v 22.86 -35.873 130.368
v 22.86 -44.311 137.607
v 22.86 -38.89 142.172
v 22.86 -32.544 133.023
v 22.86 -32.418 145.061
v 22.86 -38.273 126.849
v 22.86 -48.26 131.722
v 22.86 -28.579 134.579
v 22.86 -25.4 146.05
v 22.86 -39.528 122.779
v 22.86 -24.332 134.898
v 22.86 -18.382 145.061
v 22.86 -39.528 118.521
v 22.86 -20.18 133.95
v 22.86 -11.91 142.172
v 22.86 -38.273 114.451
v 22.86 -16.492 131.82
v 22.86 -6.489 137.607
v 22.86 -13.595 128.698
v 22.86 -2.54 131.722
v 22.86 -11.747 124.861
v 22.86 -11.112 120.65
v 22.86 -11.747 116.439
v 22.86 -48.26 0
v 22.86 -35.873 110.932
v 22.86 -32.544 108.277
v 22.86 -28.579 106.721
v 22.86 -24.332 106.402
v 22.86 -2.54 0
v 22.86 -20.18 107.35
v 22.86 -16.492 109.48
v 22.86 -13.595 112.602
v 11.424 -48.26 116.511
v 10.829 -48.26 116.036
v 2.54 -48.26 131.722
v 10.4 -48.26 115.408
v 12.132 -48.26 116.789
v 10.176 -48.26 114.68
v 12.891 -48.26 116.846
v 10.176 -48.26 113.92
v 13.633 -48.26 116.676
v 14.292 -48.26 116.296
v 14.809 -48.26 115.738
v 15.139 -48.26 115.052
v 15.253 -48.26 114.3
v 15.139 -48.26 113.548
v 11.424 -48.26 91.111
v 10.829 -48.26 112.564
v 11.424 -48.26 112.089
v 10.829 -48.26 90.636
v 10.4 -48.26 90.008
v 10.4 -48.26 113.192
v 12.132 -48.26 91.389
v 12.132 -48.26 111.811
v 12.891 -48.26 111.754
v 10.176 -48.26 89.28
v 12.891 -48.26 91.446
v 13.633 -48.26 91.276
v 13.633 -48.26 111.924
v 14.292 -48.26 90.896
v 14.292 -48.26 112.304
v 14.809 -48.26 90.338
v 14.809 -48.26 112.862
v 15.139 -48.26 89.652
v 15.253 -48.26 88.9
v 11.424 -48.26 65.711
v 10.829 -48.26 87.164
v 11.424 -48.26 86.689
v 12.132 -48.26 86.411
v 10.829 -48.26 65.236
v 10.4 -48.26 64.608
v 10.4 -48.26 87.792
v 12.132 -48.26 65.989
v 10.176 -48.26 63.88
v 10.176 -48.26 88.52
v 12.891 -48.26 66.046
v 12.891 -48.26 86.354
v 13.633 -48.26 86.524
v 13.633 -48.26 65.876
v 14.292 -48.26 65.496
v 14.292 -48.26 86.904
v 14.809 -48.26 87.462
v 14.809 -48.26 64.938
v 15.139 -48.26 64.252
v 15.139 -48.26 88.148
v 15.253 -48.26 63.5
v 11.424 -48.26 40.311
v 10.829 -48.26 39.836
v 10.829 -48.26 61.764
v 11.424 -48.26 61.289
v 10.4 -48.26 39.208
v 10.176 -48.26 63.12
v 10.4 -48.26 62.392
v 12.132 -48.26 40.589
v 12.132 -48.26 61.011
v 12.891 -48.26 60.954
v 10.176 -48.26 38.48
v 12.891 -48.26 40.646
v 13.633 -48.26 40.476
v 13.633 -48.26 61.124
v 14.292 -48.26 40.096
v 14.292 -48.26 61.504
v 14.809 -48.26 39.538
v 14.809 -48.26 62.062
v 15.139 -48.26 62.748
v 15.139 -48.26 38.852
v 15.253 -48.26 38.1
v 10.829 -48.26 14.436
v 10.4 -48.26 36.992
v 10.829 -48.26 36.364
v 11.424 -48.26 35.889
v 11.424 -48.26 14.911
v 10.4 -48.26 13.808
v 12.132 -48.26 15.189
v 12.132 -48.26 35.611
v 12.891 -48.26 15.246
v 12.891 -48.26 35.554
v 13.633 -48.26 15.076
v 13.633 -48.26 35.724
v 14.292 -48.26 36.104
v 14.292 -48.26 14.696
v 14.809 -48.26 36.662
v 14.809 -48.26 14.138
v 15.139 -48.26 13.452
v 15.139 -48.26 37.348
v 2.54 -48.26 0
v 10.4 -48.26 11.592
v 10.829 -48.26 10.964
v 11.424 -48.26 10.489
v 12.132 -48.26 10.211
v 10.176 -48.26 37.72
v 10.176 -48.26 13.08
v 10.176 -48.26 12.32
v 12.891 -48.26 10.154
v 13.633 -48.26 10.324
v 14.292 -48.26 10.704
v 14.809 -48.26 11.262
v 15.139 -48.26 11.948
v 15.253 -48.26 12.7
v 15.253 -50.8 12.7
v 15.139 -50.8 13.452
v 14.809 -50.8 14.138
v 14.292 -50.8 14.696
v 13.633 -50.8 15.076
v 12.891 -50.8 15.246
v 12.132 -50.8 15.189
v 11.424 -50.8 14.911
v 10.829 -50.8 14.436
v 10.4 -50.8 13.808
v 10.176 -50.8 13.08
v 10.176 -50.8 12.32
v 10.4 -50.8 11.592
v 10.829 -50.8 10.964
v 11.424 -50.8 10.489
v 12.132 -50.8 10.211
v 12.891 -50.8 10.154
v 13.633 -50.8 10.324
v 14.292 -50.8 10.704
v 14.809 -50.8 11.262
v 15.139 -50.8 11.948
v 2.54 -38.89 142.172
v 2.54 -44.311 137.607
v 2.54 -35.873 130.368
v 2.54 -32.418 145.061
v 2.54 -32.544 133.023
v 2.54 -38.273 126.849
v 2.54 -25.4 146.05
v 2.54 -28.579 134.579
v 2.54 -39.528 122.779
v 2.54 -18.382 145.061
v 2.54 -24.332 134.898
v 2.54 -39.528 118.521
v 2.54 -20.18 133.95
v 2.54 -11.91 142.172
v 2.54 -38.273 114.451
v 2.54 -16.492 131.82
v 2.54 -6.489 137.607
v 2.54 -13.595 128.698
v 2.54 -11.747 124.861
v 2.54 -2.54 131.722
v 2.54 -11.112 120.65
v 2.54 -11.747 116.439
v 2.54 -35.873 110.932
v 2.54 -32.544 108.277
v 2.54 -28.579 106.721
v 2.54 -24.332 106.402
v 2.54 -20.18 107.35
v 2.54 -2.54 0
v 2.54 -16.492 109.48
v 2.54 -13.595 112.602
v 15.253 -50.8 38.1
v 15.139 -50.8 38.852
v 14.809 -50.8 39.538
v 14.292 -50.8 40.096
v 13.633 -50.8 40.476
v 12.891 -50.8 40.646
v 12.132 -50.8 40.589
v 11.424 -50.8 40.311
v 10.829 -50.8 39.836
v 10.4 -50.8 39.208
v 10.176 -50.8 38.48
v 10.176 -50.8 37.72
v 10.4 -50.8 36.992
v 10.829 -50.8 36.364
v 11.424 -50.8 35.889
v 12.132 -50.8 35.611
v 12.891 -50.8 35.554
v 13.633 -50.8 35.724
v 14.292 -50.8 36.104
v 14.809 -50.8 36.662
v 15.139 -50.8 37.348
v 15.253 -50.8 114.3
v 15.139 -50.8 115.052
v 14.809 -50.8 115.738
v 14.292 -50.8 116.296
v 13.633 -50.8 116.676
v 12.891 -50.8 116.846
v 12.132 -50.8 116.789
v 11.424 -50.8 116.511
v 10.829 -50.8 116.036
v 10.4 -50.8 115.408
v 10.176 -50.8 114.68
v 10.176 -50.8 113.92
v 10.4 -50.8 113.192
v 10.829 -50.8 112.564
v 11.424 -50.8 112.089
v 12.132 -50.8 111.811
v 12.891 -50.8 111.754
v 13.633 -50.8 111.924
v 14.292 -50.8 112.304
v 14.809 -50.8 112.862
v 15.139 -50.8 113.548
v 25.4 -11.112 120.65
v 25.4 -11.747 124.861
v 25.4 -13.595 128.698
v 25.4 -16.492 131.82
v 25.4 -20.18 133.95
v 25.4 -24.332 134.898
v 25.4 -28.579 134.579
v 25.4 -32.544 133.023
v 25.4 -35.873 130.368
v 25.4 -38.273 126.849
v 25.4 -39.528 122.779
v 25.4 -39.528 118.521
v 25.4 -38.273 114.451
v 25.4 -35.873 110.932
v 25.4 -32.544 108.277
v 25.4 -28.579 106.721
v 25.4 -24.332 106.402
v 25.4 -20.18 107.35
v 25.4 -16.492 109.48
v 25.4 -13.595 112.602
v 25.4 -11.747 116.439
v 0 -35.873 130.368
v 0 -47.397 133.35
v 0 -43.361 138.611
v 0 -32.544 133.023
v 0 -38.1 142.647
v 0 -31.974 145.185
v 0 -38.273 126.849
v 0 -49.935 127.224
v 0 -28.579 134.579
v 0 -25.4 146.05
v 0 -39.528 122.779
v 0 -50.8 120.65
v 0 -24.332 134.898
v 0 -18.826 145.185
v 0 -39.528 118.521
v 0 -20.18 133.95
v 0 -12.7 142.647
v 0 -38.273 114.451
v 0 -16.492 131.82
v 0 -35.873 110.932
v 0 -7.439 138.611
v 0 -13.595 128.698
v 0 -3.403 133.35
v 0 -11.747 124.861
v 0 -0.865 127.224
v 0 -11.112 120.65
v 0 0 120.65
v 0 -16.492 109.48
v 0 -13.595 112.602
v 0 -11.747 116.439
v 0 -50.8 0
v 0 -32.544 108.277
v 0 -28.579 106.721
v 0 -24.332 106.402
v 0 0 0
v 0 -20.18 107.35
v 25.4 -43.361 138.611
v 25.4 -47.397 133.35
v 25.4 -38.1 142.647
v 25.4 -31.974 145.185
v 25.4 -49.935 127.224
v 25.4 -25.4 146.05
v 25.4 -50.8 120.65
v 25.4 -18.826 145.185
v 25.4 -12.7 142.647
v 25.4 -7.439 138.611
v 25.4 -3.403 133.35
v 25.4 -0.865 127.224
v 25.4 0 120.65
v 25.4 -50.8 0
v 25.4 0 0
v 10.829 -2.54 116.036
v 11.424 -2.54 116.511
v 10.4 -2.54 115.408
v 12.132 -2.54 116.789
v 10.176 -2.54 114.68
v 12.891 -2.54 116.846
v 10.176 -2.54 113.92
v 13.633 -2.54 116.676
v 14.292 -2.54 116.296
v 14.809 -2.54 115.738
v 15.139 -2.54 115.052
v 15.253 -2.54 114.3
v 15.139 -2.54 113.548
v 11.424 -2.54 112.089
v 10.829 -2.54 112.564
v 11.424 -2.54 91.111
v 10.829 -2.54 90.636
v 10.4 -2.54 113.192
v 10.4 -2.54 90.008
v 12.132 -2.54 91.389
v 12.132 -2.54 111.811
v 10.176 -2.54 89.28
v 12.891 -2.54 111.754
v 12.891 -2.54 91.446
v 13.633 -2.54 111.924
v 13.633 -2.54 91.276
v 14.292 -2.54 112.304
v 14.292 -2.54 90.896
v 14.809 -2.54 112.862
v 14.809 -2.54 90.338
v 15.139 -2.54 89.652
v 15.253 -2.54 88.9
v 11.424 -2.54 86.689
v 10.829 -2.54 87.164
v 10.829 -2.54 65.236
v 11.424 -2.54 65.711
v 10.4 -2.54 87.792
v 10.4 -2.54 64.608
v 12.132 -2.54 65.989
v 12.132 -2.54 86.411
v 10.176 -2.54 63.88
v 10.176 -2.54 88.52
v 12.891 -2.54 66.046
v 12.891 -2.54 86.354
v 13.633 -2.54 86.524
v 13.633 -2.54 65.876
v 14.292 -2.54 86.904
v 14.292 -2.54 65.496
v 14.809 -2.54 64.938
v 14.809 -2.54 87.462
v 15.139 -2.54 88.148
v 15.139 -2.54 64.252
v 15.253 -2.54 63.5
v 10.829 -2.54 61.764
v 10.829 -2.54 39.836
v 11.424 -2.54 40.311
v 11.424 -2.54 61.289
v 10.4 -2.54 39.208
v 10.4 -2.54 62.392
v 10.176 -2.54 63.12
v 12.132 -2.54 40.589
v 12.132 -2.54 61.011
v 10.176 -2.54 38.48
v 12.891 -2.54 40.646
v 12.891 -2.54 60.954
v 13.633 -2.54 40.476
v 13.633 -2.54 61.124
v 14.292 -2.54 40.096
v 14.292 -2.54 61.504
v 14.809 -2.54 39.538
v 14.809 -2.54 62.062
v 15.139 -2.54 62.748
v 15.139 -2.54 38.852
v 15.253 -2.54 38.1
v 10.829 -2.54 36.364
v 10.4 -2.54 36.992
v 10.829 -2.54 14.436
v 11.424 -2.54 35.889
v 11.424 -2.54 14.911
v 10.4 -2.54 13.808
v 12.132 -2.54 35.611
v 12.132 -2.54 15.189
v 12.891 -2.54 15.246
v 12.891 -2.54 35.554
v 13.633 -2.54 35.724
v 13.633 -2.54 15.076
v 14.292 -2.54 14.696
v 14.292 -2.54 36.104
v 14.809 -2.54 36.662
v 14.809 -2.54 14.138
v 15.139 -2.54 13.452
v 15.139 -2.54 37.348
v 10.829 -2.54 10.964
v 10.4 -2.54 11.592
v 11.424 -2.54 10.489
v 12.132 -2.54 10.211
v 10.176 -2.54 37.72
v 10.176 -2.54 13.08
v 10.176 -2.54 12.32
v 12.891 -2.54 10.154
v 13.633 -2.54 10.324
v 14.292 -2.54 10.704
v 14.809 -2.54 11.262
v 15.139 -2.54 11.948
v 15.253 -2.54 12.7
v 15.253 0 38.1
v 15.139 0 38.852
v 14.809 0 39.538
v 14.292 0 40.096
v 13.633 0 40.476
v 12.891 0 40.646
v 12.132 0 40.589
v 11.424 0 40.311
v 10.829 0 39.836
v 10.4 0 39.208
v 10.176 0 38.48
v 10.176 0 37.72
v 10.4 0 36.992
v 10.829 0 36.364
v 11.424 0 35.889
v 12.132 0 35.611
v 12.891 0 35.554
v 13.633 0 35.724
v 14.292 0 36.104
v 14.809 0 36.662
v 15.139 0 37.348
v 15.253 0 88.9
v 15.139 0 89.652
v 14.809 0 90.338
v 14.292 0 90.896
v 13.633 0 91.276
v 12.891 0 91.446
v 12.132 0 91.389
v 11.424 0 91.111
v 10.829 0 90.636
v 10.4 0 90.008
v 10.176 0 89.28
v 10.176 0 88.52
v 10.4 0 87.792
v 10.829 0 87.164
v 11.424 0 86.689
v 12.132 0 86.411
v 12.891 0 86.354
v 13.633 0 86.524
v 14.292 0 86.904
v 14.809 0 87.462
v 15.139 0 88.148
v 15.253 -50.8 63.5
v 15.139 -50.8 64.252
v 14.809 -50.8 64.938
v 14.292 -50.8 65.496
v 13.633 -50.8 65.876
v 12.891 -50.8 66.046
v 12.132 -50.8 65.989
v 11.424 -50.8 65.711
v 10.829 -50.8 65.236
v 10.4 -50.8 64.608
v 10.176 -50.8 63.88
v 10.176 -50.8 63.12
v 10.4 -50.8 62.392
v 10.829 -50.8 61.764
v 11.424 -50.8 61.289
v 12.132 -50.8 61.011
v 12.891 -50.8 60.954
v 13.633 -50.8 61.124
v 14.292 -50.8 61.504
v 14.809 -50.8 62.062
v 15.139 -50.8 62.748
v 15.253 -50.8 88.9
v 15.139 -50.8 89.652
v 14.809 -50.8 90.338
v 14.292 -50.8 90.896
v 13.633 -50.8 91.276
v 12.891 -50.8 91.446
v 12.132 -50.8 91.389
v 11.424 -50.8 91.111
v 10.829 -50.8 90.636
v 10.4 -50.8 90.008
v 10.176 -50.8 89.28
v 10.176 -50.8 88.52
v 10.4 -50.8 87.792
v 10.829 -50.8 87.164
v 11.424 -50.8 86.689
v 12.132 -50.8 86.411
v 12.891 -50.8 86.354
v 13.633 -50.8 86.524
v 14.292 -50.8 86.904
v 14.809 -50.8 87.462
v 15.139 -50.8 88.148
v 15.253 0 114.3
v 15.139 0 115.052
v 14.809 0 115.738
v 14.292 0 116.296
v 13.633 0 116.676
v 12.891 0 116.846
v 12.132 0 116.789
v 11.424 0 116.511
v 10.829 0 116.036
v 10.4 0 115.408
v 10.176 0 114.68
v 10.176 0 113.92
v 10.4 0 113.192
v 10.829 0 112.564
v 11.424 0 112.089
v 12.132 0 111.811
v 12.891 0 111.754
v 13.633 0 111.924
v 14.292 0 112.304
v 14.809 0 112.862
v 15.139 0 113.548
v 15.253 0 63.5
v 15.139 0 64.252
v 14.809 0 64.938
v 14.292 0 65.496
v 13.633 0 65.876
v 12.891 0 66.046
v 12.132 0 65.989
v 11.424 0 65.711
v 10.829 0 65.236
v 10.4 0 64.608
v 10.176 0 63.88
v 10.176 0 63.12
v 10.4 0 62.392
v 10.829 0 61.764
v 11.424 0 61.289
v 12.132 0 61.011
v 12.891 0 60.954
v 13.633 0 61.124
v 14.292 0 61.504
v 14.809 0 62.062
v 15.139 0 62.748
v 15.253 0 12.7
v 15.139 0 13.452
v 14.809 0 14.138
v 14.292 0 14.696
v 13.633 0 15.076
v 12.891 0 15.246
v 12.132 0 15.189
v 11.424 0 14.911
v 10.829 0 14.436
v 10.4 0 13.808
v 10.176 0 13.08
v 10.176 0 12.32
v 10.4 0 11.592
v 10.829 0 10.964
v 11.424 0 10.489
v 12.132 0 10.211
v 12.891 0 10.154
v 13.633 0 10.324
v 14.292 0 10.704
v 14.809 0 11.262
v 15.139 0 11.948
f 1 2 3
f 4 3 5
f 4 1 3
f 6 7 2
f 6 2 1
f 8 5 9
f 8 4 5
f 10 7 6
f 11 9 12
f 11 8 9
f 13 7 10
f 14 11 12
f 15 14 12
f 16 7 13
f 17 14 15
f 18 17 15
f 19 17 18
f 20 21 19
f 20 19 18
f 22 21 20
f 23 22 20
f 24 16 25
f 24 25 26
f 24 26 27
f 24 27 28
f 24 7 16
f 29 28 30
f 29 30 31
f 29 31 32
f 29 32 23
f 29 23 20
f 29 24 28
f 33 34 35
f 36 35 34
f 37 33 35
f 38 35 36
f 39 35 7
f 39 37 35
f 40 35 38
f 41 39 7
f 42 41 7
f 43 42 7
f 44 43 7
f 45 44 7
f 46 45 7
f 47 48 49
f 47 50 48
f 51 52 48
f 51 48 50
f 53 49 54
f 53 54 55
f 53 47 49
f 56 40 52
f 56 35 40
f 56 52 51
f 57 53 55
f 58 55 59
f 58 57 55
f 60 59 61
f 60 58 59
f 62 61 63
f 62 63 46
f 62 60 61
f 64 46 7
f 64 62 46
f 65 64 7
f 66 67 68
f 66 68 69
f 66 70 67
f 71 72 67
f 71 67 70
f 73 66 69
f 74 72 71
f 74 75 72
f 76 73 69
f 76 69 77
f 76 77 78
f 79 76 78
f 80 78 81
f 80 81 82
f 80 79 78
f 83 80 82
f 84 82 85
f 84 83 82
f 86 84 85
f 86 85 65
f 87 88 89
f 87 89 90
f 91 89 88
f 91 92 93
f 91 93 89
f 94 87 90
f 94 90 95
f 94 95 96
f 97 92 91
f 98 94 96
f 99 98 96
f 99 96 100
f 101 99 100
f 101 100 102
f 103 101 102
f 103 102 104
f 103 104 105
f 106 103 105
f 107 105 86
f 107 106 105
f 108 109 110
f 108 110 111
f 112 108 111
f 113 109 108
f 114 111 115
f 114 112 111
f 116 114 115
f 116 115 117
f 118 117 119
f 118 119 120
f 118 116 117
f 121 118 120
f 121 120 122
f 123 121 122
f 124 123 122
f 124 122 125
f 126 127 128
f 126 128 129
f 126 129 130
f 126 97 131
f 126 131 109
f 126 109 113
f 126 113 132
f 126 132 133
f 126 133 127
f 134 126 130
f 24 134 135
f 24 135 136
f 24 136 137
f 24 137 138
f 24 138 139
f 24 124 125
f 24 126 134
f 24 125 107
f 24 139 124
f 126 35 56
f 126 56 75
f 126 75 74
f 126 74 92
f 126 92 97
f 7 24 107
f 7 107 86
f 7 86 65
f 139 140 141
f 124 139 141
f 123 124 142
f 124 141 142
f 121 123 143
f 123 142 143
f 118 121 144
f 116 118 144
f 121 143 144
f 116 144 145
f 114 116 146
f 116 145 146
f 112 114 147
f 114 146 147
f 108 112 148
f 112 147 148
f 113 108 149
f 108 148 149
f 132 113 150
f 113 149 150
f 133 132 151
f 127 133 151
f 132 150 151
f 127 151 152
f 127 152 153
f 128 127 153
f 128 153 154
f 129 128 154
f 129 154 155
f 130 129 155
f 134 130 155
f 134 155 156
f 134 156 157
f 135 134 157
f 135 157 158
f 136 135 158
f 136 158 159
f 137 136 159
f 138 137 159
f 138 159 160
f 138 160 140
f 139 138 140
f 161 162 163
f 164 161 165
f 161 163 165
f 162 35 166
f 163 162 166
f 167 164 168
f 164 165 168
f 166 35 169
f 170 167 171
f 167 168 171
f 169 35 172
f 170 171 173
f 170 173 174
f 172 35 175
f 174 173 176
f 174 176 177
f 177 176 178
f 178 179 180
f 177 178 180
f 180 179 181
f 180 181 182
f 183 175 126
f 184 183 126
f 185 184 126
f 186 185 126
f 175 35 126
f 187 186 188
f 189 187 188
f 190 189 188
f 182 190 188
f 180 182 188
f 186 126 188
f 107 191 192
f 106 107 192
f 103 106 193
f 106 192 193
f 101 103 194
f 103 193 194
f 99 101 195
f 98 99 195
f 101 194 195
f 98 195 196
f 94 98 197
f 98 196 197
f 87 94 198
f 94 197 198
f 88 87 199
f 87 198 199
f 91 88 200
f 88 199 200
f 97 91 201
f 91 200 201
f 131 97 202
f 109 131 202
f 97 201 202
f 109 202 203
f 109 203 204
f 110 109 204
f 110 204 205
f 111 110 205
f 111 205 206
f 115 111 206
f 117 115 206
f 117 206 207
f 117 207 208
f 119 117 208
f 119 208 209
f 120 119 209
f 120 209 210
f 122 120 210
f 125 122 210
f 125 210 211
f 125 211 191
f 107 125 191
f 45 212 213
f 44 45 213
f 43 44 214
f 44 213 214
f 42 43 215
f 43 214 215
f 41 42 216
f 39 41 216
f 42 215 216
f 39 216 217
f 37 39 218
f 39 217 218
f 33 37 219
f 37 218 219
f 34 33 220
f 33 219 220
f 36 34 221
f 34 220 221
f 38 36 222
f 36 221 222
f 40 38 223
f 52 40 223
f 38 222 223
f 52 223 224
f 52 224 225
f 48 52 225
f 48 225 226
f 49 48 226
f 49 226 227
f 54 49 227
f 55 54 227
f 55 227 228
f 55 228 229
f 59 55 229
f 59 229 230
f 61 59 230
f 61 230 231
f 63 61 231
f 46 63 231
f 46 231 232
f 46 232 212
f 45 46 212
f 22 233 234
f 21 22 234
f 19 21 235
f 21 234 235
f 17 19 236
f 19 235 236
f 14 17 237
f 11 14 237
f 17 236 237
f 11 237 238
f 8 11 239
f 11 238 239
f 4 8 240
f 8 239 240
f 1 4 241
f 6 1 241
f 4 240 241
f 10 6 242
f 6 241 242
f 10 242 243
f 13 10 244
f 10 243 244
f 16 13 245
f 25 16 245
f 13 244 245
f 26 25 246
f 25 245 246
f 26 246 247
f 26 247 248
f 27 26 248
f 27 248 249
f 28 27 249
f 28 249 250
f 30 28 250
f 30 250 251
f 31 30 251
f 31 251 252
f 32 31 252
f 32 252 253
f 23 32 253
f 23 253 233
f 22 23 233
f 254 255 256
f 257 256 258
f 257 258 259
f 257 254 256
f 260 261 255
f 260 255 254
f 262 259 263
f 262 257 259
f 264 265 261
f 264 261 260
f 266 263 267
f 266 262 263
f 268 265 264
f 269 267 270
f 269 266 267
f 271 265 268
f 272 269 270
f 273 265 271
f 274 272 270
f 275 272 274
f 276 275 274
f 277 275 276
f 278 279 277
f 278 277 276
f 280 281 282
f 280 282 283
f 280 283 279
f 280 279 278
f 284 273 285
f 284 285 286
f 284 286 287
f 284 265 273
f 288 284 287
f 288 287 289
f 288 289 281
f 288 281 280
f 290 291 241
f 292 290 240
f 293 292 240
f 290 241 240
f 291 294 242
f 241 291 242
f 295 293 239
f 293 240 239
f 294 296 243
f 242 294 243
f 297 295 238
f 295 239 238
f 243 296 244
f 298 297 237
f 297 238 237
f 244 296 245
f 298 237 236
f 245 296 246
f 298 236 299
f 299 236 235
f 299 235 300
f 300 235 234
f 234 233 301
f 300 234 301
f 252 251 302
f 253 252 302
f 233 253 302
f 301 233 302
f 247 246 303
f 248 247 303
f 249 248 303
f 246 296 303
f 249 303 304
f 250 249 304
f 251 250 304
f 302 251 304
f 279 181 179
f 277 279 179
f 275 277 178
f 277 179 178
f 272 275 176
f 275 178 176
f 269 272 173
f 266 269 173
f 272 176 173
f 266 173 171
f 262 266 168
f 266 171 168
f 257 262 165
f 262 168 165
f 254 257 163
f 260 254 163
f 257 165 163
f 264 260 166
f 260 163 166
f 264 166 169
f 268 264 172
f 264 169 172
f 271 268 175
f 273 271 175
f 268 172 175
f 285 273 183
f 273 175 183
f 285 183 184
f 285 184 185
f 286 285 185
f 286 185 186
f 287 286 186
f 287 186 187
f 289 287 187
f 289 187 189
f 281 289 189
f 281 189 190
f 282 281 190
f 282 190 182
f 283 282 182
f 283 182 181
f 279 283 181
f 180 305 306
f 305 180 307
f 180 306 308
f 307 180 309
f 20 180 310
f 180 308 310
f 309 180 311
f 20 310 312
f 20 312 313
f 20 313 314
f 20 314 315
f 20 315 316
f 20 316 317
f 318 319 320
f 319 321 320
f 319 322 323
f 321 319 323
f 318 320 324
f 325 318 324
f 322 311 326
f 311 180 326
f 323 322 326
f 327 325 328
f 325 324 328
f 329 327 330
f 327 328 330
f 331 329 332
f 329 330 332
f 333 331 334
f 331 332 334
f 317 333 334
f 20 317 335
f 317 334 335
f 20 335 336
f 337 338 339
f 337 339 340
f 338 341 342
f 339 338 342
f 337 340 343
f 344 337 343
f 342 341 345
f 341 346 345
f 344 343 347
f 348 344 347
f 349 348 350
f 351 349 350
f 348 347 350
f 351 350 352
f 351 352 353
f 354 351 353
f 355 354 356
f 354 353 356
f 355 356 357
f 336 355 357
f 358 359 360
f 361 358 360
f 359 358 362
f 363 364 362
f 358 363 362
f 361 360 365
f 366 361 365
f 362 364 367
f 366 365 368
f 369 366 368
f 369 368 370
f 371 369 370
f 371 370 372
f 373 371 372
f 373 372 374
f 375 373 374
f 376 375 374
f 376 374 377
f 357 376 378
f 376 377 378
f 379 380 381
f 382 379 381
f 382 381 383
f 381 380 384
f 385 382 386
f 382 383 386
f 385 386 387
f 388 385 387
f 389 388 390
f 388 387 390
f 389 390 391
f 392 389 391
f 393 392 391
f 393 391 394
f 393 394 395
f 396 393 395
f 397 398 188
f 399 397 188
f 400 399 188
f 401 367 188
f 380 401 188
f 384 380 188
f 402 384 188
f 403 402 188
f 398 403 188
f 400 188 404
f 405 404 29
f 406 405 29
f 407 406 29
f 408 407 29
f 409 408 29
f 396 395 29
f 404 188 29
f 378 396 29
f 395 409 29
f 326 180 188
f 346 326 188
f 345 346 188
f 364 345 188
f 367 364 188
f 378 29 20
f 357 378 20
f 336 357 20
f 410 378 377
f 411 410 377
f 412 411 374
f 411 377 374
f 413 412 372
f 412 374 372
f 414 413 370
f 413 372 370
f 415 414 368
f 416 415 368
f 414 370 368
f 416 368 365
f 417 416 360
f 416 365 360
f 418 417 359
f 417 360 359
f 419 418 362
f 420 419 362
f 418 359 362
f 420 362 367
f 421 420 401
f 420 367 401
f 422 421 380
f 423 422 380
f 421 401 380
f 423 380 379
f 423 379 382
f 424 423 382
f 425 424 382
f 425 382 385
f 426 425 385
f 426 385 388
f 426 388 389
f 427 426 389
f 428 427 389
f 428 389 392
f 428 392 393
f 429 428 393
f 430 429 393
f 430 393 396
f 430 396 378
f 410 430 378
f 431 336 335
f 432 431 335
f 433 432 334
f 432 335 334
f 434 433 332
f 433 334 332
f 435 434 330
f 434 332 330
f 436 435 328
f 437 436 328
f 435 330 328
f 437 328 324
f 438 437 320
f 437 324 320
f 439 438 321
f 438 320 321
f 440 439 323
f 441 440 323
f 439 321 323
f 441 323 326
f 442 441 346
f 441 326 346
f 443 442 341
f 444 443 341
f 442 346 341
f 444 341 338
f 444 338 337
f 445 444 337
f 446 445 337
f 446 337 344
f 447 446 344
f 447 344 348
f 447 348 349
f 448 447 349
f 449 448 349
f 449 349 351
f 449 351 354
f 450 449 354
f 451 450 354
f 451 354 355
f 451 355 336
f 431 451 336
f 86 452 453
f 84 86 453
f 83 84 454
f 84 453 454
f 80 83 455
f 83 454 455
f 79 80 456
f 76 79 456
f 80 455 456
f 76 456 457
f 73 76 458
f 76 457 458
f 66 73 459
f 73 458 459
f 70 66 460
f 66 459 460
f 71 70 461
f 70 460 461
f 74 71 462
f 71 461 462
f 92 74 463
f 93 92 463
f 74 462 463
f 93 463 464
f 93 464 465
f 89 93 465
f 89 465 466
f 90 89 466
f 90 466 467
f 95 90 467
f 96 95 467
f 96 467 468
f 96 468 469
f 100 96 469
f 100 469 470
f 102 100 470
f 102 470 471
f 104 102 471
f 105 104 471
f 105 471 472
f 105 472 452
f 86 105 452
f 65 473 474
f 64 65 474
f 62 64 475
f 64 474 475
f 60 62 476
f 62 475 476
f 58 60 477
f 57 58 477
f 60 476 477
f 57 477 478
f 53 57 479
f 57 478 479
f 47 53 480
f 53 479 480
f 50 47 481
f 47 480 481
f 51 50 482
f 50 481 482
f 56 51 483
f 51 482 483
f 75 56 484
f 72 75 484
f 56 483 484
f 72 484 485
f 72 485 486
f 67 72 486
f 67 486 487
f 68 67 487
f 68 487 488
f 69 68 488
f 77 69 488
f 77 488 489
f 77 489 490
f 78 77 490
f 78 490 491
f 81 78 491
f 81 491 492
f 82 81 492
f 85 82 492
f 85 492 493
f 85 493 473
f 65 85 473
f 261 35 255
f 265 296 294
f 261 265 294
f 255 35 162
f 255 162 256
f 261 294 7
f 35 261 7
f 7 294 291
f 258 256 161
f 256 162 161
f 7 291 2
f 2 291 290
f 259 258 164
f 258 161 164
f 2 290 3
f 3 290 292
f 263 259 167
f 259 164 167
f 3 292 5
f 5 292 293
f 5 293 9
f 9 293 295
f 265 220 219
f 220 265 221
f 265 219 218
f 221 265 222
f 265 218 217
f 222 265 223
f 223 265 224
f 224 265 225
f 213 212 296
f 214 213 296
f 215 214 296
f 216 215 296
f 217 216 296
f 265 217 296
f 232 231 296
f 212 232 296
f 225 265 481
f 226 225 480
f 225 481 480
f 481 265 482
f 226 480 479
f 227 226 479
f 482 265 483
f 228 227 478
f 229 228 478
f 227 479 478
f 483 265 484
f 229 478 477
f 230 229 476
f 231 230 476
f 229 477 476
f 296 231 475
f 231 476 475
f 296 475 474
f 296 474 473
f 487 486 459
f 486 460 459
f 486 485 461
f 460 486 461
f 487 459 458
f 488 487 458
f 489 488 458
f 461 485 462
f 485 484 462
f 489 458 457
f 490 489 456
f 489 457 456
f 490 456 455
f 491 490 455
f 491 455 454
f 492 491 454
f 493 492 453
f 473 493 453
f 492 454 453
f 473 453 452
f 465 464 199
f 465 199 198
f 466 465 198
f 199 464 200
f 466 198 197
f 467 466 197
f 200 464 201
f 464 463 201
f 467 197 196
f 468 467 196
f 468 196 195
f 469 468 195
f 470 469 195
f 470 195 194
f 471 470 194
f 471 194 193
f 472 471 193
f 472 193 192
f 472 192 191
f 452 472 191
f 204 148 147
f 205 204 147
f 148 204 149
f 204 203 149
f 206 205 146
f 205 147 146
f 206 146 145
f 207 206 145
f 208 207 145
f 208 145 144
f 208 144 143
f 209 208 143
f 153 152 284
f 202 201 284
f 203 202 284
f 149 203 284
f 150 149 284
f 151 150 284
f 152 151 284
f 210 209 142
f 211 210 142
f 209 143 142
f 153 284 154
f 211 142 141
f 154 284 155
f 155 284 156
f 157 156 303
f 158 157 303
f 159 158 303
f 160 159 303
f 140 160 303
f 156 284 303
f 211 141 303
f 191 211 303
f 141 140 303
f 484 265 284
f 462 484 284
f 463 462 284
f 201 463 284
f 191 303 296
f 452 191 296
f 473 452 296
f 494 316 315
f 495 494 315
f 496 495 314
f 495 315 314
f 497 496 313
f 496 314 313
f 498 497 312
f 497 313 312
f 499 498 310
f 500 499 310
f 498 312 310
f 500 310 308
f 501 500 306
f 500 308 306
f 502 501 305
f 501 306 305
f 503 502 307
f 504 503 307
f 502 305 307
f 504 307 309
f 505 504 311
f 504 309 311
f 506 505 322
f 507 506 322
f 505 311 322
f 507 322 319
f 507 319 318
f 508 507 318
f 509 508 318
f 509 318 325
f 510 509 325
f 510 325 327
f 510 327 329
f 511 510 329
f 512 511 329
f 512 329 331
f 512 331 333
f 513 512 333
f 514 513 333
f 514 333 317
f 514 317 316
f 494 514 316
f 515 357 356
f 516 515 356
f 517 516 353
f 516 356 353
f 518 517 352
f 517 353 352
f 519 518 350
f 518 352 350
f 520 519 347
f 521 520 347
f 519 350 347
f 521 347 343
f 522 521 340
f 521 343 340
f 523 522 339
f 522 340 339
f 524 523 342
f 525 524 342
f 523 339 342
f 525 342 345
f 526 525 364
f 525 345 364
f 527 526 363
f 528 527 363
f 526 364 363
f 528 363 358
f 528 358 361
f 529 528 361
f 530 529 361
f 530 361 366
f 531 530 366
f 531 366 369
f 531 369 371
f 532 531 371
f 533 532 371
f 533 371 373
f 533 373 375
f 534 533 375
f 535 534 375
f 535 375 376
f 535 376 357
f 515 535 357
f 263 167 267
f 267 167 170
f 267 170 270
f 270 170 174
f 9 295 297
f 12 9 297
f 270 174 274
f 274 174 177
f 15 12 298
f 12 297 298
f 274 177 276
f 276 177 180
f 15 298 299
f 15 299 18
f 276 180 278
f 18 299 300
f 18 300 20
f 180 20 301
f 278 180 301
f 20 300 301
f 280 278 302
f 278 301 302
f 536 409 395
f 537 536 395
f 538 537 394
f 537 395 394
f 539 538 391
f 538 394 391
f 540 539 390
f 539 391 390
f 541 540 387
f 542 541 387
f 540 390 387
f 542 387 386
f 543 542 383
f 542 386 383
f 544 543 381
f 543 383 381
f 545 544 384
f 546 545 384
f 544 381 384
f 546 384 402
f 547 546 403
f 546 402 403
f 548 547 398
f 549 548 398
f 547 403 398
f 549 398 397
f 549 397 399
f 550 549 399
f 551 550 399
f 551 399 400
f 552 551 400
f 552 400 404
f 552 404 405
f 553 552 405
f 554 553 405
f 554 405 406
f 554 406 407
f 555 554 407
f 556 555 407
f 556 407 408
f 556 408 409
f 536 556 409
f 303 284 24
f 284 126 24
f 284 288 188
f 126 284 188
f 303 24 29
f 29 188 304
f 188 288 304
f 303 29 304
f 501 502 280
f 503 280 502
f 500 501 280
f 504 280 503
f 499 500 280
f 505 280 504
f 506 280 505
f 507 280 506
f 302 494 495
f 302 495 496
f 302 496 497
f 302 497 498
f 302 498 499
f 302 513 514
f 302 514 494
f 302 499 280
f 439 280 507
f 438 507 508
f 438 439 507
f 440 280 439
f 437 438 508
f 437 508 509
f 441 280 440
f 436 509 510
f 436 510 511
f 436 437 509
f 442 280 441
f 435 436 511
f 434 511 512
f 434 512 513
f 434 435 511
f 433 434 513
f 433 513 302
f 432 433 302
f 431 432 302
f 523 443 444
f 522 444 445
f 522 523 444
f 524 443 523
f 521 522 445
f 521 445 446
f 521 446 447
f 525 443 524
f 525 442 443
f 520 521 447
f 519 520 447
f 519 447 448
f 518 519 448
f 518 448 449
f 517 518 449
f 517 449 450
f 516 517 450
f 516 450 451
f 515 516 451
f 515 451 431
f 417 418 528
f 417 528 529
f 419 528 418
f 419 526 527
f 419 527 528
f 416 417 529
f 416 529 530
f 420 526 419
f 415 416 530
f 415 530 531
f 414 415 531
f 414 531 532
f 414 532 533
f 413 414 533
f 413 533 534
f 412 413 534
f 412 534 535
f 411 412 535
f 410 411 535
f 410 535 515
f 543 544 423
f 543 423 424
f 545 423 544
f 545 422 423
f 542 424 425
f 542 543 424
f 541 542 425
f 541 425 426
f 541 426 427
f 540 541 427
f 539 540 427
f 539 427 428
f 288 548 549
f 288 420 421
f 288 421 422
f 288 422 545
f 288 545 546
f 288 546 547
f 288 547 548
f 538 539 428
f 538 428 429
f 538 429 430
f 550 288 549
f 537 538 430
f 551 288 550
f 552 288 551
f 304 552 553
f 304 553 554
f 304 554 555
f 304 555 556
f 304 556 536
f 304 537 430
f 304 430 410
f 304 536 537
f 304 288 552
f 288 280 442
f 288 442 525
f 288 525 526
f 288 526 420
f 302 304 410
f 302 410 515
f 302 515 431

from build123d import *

# Parameters (mm, degrees)
F0_W     = 25.4
F0_H     = 50.8
F0_W_2   = 20.32
F0_H_2   = 45.72
F1_DEPTH = 146.05
F2_R     = 2.5527
F3_DEPTH = 76.2
F4_R     = 14.2875
F5_DEPTH = 25.4


# Not quite as in the source:
# - a feature names something its author has since deleted; it is built from what else it names


with BuildPart() as f1:
    # F0 (on Top) → F1 (new body)
    with BuildSketch(Plane.XY):
        with Locations((12.7, -25.4)):
            Rectangle(F0_W, F0_H)
        with Locations((12.7, -25.4)):
            Rectangle(F0_W_2, F0_H_2, mode=Mode.SUBTRACT)
    extrude(amount=F1_DEPTH)

    # F2 (on face) → F3 (cut)
    with BuildSketch(Plane.XZ.offset(50.8)):
        with Locations((12.7, 88.9)):
            Circle(F2_R)
        with Locations((12.7, 63.5)):
            Circle(F2_R)
        with Locations((12.7, 38.1)):
            Circle(F2_R)
        with Locations((12.7, 12.7)):
            Circle(F2_R)
        with Locations((12.7, 114.3)):
            Circle(F2_R)
        with Locations((12.7, 139.7)):
            Circle(F2_R)
    extrude(amount=-F3_DEPTH, mode=Mode.SUBTRACT)

    # F4 (on face) → F5 (cut)
    with BuildSketch(Plane.YZ.offset(25.4)):
        with Locations((-25.4, 120.65)):
            Circle(F4_R)
        with BuildLine():
            ThreePointArc((-50.8, 120.65), (-43.3605122421, 138.6105122421), (-25.4, 146.05))
            Line((-25.4, 146.05), (-50.8, 146.05))
            Line((-50.8, 146.05), (-50.8, 120.65))
        make_face()
        with BuildLine():
            ThreePointArc((-25.4, 146.05), (-7.4394877579, 138.6105122421), (0, 120.65))
            Line((0, 120.65), (0, 146.05))
            Line((0, 146.05), (-25.4, 146.05))
        make_face()
    extrude(amount=-F5_DEPTH, mode=Mode.SUBTRACT)


solid = f1.part
